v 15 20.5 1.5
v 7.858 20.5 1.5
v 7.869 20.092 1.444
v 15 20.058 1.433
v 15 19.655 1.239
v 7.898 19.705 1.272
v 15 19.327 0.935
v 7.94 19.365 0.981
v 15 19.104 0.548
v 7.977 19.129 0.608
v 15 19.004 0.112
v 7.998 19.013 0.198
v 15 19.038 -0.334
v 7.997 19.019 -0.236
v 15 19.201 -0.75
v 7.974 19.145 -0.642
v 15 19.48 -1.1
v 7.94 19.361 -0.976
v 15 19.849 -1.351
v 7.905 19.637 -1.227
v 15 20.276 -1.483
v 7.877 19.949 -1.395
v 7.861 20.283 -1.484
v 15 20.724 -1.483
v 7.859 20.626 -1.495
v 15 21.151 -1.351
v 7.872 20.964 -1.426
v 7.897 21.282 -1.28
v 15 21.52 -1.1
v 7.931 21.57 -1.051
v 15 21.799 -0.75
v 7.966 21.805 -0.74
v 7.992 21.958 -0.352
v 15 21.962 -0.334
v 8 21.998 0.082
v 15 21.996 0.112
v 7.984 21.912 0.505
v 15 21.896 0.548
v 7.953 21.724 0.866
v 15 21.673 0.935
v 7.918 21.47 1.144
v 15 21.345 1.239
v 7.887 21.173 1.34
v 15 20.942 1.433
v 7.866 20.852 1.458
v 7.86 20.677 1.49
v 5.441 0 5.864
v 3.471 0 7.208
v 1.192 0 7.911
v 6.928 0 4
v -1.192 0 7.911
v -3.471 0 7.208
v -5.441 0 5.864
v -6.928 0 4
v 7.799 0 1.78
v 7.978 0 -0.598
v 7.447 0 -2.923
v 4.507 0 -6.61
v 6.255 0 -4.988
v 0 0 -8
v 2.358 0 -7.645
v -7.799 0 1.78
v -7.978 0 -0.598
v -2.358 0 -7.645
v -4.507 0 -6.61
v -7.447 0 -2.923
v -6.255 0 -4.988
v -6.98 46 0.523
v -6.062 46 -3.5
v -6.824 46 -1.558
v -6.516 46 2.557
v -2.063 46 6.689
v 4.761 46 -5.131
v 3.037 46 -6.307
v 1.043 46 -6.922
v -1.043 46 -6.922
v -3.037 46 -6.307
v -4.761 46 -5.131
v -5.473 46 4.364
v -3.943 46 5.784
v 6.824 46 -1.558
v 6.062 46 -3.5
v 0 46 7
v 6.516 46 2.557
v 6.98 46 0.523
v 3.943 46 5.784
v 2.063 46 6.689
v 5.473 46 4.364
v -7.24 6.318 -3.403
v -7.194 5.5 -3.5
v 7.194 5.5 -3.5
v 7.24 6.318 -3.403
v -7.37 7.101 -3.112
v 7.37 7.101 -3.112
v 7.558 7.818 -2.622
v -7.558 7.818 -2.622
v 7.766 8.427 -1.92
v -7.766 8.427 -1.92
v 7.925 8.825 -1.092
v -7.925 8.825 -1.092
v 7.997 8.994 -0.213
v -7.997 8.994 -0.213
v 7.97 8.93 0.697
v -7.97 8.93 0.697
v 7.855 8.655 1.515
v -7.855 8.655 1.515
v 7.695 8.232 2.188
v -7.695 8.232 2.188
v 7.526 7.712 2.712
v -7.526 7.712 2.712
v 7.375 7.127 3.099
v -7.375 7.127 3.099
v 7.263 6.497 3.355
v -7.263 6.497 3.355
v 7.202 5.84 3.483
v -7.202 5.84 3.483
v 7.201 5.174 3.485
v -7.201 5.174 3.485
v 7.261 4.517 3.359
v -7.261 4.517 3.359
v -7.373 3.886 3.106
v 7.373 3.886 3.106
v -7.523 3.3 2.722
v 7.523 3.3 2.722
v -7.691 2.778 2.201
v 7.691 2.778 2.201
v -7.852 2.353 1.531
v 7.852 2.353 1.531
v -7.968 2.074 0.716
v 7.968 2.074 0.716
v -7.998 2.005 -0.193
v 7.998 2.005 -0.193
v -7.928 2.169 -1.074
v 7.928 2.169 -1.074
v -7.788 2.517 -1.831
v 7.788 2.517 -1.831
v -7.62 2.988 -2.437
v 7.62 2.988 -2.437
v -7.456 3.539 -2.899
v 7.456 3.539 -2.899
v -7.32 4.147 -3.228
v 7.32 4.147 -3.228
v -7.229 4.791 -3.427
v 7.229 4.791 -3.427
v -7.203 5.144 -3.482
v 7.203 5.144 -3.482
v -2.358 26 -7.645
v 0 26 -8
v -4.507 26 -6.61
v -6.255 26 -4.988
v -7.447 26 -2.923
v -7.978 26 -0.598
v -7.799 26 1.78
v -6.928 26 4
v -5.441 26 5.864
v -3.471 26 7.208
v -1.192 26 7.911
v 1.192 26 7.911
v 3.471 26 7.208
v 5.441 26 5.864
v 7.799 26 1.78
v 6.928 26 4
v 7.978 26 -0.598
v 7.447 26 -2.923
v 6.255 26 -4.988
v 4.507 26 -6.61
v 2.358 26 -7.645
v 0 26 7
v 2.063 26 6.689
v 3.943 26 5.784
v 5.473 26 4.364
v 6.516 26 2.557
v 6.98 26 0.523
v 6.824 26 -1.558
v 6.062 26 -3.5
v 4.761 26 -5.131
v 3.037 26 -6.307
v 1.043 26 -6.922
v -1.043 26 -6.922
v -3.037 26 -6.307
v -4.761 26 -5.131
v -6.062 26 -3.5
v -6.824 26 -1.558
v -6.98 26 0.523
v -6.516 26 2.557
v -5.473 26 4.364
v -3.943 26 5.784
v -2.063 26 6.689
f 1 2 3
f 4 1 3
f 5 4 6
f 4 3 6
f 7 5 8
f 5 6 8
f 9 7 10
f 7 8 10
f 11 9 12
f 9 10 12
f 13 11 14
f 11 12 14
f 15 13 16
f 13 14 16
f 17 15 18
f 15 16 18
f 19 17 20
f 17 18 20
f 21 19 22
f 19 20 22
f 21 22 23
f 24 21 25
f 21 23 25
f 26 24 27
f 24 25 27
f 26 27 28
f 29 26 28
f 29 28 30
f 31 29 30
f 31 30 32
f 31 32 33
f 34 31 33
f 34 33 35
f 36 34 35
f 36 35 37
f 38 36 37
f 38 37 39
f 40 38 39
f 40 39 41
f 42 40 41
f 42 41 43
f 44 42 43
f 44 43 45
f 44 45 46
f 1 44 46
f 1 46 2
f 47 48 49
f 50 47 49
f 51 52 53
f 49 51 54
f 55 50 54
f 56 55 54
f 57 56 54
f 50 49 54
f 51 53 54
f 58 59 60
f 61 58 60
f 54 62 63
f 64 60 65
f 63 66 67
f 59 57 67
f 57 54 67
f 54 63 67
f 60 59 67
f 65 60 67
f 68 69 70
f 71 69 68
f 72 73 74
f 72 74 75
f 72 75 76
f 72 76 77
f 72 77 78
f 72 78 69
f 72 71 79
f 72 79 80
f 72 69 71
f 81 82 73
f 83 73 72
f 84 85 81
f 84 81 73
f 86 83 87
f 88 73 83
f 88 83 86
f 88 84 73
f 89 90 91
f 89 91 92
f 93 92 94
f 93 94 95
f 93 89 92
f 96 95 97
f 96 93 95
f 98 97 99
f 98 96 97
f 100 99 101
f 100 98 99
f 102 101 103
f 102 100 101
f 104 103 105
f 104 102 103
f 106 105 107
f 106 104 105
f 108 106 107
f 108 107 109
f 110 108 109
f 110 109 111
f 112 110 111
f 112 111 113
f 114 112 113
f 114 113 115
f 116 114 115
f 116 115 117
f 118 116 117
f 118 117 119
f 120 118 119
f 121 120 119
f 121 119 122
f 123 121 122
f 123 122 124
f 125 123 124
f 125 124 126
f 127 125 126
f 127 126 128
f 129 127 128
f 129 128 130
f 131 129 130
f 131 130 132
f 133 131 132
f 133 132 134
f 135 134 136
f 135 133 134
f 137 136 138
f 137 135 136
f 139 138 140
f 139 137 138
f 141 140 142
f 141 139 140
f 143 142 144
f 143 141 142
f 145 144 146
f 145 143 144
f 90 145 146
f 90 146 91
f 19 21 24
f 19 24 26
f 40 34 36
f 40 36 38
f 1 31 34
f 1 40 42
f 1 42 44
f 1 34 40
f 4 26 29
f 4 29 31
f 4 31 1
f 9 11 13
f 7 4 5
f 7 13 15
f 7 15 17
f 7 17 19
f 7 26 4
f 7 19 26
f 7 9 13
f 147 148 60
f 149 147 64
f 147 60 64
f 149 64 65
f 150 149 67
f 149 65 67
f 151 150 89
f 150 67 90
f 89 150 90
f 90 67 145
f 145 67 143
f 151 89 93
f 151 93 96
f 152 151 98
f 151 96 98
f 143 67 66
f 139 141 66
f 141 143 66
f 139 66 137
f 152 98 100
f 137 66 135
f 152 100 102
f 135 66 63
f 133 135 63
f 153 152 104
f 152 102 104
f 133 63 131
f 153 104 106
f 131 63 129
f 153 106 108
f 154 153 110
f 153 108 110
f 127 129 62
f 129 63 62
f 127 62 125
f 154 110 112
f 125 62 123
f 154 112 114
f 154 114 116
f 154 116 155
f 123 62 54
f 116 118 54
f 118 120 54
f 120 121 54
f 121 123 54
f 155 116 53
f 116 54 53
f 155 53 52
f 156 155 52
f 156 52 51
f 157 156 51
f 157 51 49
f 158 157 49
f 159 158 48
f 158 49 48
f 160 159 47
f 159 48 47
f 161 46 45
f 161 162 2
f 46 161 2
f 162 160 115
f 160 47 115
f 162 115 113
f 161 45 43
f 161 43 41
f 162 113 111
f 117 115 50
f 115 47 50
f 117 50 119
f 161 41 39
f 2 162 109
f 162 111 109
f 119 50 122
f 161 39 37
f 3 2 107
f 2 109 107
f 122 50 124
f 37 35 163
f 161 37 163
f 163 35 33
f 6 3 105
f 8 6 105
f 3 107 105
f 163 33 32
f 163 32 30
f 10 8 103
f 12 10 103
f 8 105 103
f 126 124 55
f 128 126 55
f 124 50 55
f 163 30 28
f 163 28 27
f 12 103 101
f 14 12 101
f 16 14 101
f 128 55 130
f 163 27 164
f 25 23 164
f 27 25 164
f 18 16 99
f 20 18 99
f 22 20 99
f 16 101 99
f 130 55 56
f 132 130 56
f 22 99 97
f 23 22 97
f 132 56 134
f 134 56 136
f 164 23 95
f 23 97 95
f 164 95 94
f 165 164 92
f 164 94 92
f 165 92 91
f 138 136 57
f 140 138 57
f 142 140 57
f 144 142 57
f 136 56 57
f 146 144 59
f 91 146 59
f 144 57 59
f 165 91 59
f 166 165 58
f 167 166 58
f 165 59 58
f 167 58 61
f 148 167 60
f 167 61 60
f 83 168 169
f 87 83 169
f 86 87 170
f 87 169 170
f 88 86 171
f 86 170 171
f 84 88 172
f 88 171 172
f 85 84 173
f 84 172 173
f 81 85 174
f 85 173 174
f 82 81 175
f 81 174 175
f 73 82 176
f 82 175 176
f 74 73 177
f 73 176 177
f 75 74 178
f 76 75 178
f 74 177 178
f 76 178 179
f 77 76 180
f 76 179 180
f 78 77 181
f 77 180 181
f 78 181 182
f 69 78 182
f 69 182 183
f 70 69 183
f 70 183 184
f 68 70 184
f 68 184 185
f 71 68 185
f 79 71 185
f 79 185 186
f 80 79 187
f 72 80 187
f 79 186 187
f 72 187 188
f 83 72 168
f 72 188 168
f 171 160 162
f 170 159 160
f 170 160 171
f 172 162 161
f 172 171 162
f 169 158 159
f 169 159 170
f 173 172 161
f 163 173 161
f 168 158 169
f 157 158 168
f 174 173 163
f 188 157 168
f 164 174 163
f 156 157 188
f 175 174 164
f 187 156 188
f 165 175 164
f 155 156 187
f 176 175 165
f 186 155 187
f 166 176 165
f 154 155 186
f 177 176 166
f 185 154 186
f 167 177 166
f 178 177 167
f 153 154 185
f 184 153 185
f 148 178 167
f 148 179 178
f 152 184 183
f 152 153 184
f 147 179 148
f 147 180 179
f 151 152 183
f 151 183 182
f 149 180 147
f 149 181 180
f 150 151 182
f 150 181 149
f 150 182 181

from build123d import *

# Parameters (mm, degrees)
SKETCH2_R               = 8
BOSS_EXTRUDE1_DEPTH     = 26
CUT_EXTRUDE1_DEPTH      = 29.354893758
CUT_EXTRUDE1_DEPTH_BACK = 29.354893758
SKETCH3_R               = 3.5
SKETCH4_R               = 1.5
BOSS_EXTRUDE2_DEPTH     = 15
SKETCH6_R               = 7
BOSS_EXTRUDE3_DEPTH     = 20


with BuildPart() as part:
    # Sketch2 → Boss-Extrude1 (new body)
    with BuildSketch(Plane(origin=(0, 0, 0), x_dir=(1, 0, 0), z_dir=(0, 1, 0))):
        with Locations(Location((0, 0, 0), (0, 0, 90))):
            Circle(SKETCH2_R)
    extrude(amount=BOSS_EXTRUDE1_DEPTH)

    # Sketch3 → Cut-Extrude1 (cut, two sides: drawn at the far end of the back side and taken through both)
    with BuildSketch(Plane(origin=(0, 0, 0), x_dir=(0, 0, -1), z_dir=(1, 0, 0)).offset(-CUT_EXTRUDE1_DEPTH_BACK)):
        with Locations((0, 5.5)):
            Circle(SKETCH3_R)
    extrude(amount=CUT_EXTRUDE1_DEPTH + CUT_EXTRUDE1_DEPTH_BACK, mode=Mode.SUBTRACT)

    # Sketch4 → Boss-Extrude2 (add)
    with BuildSketch(Plane(origin=(0, 0, 0), x_dir=(0, 0, -1), z_dir=(1, 0, 0))):
        with Locations(Location((0, 20.5, 0), (0, 0, 180))):
            Circle(SKETCH4_R)
    extrude(amount=BOSS_EXTRUDE2_DEPTH)

    # Sketch6 → Boss-Extrude3 (add)
    with BuildSketch(Plane(origin=(0, 26, 0), x_dir=(1, 0, 0), z_dir=(0, 1, 0))):
        with Locations(Location((0, 0, 0), (0, 0, 270))):
            Circle(SKETCH6_R)
    extrude(amount=BOSS_EXTRUDE3_DEPTH)


solid = part.part
